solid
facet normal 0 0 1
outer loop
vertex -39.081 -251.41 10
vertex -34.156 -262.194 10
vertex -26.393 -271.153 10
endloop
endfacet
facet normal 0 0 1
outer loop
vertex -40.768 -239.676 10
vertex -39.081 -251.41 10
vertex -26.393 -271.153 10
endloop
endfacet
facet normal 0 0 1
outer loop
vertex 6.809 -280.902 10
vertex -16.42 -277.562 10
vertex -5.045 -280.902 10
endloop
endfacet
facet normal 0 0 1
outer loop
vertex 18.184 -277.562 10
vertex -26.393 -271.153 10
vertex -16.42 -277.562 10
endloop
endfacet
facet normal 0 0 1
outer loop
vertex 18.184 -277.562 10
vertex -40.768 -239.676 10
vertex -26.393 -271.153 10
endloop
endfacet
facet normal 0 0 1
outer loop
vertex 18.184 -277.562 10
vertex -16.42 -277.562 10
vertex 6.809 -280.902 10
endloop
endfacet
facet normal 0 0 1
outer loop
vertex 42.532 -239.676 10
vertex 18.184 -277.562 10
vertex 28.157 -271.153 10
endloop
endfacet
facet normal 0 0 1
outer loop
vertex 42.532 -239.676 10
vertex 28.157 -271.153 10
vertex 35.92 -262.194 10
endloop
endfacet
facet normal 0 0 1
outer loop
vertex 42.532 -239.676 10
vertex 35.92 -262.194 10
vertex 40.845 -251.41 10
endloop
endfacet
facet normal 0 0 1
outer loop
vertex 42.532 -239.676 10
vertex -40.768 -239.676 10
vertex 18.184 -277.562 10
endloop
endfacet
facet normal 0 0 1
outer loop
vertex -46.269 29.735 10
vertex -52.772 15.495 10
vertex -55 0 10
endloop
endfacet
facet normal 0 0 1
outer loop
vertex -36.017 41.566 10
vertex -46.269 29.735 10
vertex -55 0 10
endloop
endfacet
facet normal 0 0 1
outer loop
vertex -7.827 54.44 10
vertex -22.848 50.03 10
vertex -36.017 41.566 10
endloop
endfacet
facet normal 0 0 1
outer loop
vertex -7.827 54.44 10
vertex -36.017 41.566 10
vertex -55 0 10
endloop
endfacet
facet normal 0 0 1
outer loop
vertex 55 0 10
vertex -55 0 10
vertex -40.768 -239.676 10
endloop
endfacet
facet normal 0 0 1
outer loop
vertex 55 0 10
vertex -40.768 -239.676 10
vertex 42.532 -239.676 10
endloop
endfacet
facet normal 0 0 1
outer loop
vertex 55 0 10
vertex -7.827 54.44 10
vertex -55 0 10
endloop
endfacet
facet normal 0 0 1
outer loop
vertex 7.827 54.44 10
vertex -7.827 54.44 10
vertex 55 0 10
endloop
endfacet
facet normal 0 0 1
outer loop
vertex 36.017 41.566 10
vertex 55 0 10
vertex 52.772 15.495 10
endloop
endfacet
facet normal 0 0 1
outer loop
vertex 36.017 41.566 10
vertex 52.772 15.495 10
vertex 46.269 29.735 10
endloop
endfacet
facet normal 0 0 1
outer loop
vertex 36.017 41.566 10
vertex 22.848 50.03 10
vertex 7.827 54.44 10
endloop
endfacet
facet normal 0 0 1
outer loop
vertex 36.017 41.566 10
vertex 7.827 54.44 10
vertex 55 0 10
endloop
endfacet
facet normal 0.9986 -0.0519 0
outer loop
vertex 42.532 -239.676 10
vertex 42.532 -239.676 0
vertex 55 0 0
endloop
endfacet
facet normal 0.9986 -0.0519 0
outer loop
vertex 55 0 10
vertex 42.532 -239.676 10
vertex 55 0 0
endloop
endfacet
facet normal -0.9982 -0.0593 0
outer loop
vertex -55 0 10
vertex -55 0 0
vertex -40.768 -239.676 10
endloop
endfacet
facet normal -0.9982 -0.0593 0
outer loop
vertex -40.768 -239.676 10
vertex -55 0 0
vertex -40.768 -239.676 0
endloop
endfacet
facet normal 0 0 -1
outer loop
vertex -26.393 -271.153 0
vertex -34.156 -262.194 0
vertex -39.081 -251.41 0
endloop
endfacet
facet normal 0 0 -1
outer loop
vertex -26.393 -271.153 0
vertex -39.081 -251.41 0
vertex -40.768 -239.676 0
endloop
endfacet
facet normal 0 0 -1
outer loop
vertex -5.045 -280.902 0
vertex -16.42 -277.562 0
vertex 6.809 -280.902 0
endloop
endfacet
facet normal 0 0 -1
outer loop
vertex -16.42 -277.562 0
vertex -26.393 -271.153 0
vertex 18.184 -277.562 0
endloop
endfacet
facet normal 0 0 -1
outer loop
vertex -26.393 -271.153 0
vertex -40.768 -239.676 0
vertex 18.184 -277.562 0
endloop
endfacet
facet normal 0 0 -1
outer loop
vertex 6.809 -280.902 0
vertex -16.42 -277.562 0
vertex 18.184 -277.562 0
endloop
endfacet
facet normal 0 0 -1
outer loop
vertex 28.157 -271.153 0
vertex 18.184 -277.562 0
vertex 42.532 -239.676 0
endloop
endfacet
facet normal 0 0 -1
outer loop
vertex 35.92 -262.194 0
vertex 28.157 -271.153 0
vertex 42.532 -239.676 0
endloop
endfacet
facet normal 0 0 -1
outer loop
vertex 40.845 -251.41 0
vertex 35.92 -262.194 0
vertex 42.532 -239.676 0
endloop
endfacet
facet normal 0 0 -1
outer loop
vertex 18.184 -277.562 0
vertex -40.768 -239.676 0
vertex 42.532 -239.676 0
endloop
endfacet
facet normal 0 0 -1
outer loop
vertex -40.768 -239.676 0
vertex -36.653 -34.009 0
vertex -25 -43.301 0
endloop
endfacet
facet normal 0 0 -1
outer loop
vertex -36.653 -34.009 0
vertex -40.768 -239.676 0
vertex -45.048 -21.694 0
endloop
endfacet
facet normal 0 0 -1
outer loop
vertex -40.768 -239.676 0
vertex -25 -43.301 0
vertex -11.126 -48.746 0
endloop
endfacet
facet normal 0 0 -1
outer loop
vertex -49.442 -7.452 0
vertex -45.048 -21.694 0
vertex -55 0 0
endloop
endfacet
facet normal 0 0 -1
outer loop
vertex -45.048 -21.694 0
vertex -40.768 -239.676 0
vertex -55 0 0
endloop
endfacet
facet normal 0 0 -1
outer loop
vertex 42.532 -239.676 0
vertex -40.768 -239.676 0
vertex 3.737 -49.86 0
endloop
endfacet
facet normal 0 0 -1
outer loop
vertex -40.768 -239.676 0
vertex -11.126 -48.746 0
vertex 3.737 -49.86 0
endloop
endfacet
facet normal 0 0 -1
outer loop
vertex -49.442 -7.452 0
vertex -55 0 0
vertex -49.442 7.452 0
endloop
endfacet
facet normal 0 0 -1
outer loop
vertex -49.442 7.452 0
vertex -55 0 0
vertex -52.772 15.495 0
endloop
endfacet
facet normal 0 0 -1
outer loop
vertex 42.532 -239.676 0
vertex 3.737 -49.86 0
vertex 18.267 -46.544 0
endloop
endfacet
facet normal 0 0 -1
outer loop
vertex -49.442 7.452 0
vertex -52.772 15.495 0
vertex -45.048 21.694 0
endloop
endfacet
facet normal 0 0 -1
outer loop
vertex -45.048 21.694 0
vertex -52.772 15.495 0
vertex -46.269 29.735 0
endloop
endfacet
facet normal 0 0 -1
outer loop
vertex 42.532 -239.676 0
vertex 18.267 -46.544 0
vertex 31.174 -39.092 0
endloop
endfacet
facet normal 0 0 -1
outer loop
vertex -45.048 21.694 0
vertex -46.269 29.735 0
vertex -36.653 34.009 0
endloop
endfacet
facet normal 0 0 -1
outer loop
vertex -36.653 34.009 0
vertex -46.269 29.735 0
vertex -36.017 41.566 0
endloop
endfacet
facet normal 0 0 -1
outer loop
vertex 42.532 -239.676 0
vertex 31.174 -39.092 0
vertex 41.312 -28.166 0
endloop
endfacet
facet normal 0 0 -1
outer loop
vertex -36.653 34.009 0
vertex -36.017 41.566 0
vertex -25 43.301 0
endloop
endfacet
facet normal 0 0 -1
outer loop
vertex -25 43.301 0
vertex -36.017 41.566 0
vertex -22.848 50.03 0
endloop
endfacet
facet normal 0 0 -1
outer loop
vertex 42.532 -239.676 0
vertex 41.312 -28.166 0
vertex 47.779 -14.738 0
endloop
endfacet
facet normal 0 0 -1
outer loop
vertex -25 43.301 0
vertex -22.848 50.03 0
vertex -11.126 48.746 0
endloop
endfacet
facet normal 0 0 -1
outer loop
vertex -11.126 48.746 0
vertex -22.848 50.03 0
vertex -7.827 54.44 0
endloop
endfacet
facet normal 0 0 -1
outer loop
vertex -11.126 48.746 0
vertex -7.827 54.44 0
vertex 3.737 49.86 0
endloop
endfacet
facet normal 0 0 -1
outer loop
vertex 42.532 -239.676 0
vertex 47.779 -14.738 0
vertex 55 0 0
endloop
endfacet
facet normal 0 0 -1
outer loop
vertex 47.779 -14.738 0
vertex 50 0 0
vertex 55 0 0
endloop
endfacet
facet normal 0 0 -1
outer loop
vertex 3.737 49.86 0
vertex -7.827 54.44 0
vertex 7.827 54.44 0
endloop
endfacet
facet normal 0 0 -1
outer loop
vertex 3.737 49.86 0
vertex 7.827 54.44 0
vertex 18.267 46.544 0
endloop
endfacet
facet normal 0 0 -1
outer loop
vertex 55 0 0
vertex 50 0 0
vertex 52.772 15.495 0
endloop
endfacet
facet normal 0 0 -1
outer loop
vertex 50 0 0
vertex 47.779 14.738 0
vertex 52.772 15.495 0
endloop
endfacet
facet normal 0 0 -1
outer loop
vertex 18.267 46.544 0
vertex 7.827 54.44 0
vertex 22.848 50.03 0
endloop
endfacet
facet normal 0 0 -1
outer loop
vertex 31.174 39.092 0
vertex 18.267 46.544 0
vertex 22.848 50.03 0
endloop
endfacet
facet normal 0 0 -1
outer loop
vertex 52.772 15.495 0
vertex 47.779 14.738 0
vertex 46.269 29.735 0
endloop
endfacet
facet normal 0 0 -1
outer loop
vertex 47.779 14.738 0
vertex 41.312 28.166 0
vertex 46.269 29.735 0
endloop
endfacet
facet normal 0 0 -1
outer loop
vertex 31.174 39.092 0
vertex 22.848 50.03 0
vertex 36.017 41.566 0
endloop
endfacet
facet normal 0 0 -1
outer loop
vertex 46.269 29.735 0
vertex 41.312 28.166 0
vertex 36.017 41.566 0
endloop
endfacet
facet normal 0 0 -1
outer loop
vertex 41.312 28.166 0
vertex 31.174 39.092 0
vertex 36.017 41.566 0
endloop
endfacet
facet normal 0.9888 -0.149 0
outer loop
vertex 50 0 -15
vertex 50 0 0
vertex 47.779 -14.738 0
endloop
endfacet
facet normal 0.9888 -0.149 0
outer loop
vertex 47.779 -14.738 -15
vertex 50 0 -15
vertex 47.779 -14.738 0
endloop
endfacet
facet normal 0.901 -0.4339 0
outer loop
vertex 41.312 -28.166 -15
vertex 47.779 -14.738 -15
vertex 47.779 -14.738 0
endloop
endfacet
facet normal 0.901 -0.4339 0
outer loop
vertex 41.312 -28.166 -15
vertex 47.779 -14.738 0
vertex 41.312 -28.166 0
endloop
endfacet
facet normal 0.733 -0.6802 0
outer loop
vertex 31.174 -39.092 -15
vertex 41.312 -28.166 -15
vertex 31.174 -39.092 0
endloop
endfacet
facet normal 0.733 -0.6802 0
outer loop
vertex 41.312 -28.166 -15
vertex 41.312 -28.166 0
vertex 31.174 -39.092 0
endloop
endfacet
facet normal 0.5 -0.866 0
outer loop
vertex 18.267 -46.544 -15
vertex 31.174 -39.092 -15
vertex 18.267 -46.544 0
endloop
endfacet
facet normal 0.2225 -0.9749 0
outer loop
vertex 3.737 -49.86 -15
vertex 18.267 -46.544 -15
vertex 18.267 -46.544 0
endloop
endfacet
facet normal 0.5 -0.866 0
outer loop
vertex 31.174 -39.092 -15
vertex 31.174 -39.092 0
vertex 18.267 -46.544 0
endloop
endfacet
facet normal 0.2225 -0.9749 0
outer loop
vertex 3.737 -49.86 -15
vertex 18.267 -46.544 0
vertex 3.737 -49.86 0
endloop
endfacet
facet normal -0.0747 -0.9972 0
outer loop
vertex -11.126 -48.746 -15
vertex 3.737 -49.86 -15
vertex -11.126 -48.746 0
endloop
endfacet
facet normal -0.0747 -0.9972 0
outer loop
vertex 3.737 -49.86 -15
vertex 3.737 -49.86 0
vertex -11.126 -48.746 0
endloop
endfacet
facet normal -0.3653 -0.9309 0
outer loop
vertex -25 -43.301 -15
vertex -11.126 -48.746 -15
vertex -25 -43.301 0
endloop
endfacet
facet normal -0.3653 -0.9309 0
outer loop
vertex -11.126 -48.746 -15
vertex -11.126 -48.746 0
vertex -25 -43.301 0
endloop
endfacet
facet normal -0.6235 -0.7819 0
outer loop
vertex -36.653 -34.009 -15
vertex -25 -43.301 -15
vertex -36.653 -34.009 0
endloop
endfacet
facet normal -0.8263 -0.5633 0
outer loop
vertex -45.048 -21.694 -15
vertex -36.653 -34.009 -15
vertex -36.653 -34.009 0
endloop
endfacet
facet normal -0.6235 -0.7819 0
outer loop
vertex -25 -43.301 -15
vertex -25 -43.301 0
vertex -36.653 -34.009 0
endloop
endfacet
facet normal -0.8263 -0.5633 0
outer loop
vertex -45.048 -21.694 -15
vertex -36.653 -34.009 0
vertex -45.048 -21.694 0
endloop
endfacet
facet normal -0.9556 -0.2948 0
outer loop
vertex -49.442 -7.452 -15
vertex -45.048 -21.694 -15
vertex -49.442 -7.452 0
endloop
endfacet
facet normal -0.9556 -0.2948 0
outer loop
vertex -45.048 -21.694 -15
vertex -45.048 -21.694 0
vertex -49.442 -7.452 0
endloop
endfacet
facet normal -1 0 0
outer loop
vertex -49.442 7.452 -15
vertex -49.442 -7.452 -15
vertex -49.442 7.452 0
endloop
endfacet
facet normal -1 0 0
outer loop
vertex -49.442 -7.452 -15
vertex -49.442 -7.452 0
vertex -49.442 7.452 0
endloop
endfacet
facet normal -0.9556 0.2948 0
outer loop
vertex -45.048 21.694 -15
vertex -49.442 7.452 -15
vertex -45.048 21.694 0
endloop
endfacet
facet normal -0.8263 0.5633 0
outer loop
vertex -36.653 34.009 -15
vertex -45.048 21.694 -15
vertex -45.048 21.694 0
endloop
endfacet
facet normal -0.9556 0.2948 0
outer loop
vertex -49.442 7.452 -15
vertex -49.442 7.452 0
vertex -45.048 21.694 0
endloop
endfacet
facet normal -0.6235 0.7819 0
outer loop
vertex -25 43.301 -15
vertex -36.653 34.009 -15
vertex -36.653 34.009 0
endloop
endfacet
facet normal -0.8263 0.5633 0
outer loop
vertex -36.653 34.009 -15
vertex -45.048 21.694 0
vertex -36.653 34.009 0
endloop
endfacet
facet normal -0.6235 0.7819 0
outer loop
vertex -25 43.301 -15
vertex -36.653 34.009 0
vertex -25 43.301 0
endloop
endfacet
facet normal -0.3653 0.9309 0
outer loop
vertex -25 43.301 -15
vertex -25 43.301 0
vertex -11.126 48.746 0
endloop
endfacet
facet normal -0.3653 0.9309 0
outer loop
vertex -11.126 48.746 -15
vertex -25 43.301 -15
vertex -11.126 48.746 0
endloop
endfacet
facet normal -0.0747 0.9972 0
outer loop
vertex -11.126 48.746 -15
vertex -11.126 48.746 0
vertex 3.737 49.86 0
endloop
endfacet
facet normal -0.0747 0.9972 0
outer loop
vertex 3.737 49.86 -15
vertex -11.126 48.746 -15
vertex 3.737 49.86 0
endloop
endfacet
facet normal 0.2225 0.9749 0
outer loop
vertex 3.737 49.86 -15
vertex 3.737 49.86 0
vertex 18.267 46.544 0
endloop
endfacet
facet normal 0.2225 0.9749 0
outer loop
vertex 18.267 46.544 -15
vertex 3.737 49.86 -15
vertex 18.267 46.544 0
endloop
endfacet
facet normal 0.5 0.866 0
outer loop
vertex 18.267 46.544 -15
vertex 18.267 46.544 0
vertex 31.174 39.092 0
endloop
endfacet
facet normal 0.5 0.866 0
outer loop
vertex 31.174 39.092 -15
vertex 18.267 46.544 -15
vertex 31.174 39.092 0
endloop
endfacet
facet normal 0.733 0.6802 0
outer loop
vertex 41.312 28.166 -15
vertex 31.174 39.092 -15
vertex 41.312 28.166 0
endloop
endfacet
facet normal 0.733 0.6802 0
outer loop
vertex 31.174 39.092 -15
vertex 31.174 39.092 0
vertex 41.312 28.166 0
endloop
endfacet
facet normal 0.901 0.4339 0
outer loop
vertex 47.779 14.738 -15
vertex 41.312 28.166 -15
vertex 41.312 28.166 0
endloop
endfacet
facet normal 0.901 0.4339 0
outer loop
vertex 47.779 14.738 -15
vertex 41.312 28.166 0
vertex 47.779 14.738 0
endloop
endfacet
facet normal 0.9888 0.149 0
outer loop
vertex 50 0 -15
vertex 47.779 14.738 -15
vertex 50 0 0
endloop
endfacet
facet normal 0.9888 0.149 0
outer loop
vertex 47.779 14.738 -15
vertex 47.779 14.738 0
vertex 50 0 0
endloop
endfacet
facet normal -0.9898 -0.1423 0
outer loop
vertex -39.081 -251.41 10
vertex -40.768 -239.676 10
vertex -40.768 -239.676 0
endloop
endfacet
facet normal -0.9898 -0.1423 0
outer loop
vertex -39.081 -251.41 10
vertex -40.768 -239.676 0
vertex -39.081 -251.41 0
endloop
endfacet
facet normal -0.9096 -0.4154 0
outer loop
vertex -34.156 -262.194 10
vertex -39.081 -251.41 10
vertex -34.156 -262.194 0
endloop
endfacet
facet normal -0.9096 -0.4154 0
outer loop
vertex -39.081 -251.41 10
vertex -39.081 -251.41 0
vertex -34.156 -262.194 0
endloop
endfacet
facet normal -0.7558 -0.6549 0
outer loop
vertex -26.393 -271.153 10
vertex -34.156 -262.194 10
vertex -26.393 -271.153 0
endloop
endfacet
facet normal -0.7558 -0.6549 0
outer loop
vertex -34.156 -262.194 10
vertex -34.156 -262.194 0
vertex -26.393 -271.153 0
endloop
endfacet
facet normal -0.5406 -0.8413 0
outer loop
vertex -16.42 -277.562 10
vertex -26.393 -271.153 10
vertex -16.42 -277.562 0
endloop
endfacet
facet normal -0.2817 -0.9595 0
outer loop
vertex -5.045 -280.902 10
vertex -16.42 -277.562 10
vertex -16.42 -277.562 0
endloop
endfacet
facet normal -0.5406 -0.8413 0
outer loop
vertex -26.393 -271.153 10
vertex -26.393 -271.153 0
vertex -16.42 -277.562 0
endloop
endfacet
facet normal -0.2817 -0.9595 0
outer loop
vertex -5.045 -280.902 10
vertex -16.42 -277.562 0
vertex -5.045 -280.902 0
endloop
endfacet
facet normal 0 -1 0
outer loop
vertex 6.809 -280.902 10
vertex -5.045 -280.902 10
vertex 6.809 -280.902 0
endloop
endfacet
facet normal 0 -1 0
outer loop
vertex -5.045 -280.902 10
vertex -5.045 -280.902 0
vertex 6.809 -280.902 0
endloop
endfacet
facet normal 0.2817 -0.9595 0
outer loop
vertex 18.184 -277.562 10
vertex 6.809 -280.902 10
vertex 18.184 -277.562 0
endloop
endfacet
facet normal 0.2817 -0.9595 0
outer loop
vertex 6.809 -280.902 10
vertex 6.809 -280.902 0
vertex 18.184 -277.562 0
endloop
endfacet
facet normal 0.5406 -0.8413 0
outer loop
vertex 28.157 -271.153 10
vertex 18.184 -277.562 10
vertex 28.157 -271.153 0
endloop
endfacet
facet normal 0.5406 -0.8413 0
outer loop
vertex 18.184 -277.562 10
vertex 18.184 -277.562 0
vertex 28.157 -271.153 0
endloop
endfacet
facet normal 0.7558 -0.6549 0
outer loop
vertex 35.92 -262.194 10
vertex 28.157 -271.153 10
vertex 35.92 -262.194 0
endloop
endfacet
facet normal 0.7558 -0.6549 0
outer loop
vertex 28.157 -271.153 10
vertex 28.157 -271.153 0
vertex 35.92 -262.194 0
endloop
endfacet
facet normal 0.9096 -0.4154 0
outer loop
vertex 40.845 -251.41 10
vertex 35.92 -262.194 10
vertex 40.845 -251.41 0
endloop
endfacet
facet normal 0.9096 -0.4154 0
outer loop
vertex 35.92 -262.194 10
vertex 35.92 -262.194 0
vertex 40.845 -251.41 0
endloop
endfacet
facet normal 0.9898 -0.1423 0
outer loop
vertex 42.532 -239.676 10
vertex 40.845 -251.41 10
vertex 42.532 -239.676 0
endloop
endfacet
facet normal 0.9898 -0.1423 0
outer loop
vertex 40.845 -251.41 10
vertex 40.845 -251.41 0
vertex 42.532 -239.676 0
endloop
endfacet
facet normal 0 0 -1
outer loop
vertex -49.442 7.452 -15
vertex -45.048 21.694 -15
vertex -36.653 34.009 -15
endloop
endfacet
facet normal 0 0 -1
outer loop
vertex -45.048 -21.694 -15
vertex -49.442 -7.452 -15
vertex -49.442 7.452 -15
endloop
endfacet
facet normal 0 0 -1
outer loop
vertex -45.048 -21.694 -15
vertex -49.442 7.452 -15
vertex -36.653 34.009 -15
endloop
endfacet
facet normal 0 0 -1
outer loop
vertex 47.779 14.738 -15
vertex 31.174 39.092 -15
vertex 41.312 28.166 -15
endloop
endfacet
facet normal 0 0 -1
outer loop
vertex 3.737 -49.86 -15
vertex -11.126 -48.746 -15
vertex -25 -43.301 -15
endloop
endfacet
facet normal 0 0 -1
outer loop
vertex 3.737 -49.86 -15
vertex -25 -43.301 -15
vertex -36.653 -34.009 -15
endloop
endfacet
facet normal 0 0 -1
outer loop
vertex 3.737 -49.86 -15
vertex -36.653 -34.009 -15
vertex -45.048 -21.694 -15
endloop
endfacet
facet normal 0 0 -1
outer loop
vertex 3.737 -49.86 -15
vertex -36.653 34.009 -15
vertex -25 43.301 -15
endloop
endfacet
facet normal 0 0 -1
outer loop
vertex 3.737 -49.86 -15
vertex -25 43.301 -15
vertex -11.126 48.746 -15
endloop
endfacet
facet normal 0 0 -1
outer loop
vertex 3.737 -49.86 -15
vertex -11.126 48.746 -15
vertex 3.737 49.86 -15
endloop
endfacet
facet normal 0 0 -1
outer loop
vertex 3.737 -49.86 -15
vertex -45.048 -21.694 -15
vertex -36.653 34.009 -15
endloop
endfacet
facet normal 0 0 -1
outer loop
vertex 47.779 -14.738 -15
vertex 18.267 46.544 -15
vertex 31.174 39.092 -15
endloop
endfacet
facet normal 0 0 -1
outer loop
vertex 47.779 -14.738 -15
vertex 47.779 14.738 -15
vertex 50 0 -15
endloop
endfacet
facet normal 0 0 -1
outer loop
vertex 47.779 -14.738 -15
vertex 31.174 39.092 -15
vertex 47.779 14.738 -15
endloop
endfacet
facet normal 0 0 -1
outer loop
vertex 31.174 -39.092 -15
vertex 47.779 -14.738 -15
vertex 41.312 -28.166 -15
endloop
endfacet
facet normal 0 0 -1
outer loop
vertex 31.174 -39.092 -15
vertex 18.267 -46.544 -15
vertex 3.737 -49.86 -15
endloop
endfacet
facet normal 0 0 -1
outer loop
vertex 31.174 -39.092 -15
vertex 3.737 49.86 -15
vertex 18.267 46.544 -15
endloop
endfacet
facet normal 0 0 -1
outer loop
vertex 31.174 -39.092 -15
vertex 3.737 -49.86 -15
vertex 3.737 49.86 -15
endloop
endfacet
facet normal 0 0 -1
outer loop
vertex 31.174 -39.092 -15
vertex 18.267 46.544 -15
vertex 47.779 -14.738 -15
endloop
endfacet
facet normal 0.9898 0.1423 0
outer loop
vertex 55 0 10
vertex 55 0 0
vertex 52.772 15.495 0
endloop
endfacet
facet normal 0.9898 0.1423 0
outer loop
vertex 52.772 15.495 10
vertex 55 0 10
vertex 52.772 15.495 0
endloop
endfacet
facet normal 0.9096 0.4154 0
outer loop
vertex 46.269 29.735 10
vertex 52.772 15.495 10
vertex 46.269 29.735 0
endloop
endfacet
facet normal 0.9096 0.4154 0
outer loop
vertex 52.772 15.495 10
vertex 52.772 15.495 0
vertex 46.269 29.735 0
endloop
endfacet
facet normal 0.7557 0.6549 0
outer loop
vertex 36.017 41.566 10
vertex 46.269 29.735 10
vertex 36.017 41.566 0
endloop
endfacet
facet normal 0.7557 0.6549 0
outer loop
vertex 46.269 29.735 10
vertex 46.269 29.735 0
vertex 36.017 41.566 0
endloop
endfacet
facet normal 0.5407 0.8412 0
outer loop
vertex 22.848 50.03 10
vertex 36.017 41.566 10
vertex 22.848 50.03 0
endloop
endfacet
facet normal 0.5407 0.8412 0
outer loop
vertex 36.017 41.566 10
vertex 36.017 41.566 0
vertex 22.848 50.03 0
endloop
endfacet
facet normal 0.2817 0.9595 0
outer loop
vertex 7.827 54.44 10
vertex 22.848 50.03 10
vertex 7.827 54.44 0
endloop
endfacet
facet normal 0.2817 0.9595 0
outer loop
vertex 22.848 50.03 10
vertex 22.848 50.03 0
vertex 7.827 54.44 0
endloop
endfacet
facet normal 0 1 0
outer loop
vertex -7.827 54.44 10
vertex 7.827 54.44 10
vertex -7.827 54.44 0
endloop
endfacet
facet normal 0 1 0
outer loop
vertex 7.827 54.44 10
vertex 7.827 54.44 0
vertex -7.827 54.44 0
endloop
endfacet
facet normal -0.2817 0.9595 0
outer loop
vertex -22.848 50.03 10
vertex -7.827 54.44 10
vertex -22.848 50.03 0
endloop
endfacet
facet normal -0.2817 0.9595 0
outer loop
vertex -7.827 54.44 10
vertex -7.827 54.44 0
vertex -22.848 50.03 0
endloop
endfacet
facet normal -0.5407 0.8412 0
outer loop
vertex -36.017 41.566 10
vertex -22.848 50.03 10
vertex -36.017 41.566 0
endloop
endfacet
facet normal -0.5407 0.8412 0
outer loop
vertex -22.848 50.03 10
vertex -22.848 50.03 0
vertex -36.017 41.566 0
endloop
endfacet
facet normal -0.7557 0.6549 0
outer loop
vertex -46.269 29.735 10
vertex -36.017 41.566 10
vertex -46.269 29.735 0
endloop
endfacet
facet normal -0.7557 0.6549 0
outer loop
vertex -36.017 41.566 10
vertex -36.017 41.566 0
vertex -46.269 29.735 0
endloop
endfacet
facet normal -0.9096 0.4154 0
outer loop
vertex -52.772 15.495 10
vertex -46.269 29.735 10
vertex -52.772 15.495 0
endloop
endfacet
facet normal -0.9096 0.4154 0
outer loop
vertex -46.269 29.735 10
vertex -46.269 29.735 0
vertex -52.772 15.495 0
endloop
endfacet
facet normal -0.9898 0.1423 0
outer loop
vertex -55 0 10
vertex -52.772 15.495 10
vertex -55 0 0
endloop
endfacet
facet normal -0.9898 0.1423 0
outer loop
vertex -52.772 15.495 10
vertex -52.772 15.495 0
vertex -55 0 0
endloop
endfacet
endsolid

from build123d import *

# Parameters (mm, degrees)
BOSS_EXTRUDE1_DEPTH      = 10
BOSS_EXTRUDE1_DEPTH_BACK = 0.0001
SKETCH2_R                = 50
BOSS_EXTRUDE2_DEPTH      = 15


with BuildPart() as part:
    # Sketch1 → Boss-Extrude1 (new, two sides: drawn at the far end of the back side and taken through both)
    with BuildSketch(Plane.XY.offset(-BOSS_EXTRUDE1_DEPTH_BACK)):
        with BuildLine():
            ThreePointArc((55, 0), (0, 55), (-55, 0))
            Line((-55, 0), (-40.768073077, -239.675921097))
            ThreePointArc((-40.768073077, -239.675921097), (0.881926923, -281.325921097), (42.531926923, -239.675921097))
            Line((42.531926923, -239.675921097), (55, 0))
        make_face()
    extrude(amount=BOSS_EXTRUDE1_DEPTH + BOSS_EXTRUDE1_DEPTH_BACK)

    # Sketch2 → Boss-Extrude2 (add)
    with BuildSketch(Plane(origin=(0, 0, -0.0001), x_dir=(-1, 0, 0), z_dir=(0, 0, -1))):
        with Locations(Location((0, 0, 0), (0, 0, 180))):
            Circle(SKETCH2_R)
    extrude(amount=BOSS_EXTRUDE2_DEPTH)


solid = part.part
